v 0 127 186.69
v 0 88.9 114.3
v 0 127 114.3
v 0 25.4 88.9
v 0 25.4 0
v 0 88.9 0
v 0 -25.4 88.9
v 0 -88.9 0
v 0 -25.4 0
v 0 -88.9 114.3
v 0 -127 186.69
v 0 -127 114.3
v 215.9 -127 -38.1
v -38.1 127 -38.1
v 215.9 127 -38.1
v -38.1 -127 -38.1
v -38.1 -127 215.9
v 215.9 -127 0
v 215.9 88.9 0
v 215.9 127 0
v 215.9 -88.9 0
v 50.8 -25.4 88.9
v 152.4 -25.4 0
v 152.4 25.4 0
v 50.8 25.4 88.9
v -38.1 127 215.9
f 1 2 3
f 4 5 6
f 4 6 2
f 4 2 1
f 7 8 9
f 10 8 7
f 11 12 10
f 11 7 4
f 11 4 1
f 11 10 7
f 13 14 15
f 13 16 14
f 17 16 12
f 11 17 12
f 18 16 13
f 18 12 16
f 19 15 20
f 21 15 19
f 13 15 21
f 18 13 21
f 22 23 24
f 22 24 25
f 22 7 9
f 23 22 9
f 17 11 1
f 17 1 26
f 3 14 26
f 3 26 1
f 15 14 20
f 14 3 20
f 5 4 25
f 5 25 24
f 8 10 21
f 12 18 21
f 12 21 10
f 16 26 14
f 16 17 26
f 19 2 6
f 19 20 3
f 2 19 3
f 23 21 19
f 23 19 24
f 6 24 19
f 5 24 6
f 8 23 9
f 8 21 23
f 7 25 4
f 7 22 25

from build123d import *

# Parameters (mm, degrees)
F1_DEPTH = 127
F3_DEPTH = 38.1
F4_DEPTH = 25.4


# Not quite as in the source:
# - a pattern or mirror of a feature is missing from the dataset's text; its kind, count and spacing are read off the source's solid


with BuildPart() as f1:
    # F0 (on Front) → F1 (new body, symmetric)
    with BuildSketch(Plane.XZ):
        Polygon((0, 88.9), (0, 186.69), (-38.1, 215.9), (-38.1, -38.1), (215.9, -38.1), (215.9, 0), (152.4, 0), (0, 0), align=None)
    extrude(amount=F1_DEPTH, both=True)

    # F2 (on face) → F3 (join)
    with BuildSketch(Plane.XZ.offset(127)):
        Polygon((215.9, 0), (0, 114.3), (0, 0), align=None)
    f3 = extrude(amount=-F3_DEPTH)

    # F3_copies: F3 across plane
    add(f3.mirror(Plane.ZX))

    # F0 (on Front) → F4 (join, symmetric)
    with BuildSketch(Plane.XZ):
        Polygon((0, 88.9), (0, 186.69), (-38.1, 215.9), (-38.1, -38.1), (215.9, -38.1), (215.9, 0), (152.4, 0), (0, 0), align=None)
        Polygon((50.8, 88.9), (0, 88.9), (0, 0), (152.4, 0), align=None)
    extrude(amount=F4_DEPTH, both=True)


solid = f1.part
